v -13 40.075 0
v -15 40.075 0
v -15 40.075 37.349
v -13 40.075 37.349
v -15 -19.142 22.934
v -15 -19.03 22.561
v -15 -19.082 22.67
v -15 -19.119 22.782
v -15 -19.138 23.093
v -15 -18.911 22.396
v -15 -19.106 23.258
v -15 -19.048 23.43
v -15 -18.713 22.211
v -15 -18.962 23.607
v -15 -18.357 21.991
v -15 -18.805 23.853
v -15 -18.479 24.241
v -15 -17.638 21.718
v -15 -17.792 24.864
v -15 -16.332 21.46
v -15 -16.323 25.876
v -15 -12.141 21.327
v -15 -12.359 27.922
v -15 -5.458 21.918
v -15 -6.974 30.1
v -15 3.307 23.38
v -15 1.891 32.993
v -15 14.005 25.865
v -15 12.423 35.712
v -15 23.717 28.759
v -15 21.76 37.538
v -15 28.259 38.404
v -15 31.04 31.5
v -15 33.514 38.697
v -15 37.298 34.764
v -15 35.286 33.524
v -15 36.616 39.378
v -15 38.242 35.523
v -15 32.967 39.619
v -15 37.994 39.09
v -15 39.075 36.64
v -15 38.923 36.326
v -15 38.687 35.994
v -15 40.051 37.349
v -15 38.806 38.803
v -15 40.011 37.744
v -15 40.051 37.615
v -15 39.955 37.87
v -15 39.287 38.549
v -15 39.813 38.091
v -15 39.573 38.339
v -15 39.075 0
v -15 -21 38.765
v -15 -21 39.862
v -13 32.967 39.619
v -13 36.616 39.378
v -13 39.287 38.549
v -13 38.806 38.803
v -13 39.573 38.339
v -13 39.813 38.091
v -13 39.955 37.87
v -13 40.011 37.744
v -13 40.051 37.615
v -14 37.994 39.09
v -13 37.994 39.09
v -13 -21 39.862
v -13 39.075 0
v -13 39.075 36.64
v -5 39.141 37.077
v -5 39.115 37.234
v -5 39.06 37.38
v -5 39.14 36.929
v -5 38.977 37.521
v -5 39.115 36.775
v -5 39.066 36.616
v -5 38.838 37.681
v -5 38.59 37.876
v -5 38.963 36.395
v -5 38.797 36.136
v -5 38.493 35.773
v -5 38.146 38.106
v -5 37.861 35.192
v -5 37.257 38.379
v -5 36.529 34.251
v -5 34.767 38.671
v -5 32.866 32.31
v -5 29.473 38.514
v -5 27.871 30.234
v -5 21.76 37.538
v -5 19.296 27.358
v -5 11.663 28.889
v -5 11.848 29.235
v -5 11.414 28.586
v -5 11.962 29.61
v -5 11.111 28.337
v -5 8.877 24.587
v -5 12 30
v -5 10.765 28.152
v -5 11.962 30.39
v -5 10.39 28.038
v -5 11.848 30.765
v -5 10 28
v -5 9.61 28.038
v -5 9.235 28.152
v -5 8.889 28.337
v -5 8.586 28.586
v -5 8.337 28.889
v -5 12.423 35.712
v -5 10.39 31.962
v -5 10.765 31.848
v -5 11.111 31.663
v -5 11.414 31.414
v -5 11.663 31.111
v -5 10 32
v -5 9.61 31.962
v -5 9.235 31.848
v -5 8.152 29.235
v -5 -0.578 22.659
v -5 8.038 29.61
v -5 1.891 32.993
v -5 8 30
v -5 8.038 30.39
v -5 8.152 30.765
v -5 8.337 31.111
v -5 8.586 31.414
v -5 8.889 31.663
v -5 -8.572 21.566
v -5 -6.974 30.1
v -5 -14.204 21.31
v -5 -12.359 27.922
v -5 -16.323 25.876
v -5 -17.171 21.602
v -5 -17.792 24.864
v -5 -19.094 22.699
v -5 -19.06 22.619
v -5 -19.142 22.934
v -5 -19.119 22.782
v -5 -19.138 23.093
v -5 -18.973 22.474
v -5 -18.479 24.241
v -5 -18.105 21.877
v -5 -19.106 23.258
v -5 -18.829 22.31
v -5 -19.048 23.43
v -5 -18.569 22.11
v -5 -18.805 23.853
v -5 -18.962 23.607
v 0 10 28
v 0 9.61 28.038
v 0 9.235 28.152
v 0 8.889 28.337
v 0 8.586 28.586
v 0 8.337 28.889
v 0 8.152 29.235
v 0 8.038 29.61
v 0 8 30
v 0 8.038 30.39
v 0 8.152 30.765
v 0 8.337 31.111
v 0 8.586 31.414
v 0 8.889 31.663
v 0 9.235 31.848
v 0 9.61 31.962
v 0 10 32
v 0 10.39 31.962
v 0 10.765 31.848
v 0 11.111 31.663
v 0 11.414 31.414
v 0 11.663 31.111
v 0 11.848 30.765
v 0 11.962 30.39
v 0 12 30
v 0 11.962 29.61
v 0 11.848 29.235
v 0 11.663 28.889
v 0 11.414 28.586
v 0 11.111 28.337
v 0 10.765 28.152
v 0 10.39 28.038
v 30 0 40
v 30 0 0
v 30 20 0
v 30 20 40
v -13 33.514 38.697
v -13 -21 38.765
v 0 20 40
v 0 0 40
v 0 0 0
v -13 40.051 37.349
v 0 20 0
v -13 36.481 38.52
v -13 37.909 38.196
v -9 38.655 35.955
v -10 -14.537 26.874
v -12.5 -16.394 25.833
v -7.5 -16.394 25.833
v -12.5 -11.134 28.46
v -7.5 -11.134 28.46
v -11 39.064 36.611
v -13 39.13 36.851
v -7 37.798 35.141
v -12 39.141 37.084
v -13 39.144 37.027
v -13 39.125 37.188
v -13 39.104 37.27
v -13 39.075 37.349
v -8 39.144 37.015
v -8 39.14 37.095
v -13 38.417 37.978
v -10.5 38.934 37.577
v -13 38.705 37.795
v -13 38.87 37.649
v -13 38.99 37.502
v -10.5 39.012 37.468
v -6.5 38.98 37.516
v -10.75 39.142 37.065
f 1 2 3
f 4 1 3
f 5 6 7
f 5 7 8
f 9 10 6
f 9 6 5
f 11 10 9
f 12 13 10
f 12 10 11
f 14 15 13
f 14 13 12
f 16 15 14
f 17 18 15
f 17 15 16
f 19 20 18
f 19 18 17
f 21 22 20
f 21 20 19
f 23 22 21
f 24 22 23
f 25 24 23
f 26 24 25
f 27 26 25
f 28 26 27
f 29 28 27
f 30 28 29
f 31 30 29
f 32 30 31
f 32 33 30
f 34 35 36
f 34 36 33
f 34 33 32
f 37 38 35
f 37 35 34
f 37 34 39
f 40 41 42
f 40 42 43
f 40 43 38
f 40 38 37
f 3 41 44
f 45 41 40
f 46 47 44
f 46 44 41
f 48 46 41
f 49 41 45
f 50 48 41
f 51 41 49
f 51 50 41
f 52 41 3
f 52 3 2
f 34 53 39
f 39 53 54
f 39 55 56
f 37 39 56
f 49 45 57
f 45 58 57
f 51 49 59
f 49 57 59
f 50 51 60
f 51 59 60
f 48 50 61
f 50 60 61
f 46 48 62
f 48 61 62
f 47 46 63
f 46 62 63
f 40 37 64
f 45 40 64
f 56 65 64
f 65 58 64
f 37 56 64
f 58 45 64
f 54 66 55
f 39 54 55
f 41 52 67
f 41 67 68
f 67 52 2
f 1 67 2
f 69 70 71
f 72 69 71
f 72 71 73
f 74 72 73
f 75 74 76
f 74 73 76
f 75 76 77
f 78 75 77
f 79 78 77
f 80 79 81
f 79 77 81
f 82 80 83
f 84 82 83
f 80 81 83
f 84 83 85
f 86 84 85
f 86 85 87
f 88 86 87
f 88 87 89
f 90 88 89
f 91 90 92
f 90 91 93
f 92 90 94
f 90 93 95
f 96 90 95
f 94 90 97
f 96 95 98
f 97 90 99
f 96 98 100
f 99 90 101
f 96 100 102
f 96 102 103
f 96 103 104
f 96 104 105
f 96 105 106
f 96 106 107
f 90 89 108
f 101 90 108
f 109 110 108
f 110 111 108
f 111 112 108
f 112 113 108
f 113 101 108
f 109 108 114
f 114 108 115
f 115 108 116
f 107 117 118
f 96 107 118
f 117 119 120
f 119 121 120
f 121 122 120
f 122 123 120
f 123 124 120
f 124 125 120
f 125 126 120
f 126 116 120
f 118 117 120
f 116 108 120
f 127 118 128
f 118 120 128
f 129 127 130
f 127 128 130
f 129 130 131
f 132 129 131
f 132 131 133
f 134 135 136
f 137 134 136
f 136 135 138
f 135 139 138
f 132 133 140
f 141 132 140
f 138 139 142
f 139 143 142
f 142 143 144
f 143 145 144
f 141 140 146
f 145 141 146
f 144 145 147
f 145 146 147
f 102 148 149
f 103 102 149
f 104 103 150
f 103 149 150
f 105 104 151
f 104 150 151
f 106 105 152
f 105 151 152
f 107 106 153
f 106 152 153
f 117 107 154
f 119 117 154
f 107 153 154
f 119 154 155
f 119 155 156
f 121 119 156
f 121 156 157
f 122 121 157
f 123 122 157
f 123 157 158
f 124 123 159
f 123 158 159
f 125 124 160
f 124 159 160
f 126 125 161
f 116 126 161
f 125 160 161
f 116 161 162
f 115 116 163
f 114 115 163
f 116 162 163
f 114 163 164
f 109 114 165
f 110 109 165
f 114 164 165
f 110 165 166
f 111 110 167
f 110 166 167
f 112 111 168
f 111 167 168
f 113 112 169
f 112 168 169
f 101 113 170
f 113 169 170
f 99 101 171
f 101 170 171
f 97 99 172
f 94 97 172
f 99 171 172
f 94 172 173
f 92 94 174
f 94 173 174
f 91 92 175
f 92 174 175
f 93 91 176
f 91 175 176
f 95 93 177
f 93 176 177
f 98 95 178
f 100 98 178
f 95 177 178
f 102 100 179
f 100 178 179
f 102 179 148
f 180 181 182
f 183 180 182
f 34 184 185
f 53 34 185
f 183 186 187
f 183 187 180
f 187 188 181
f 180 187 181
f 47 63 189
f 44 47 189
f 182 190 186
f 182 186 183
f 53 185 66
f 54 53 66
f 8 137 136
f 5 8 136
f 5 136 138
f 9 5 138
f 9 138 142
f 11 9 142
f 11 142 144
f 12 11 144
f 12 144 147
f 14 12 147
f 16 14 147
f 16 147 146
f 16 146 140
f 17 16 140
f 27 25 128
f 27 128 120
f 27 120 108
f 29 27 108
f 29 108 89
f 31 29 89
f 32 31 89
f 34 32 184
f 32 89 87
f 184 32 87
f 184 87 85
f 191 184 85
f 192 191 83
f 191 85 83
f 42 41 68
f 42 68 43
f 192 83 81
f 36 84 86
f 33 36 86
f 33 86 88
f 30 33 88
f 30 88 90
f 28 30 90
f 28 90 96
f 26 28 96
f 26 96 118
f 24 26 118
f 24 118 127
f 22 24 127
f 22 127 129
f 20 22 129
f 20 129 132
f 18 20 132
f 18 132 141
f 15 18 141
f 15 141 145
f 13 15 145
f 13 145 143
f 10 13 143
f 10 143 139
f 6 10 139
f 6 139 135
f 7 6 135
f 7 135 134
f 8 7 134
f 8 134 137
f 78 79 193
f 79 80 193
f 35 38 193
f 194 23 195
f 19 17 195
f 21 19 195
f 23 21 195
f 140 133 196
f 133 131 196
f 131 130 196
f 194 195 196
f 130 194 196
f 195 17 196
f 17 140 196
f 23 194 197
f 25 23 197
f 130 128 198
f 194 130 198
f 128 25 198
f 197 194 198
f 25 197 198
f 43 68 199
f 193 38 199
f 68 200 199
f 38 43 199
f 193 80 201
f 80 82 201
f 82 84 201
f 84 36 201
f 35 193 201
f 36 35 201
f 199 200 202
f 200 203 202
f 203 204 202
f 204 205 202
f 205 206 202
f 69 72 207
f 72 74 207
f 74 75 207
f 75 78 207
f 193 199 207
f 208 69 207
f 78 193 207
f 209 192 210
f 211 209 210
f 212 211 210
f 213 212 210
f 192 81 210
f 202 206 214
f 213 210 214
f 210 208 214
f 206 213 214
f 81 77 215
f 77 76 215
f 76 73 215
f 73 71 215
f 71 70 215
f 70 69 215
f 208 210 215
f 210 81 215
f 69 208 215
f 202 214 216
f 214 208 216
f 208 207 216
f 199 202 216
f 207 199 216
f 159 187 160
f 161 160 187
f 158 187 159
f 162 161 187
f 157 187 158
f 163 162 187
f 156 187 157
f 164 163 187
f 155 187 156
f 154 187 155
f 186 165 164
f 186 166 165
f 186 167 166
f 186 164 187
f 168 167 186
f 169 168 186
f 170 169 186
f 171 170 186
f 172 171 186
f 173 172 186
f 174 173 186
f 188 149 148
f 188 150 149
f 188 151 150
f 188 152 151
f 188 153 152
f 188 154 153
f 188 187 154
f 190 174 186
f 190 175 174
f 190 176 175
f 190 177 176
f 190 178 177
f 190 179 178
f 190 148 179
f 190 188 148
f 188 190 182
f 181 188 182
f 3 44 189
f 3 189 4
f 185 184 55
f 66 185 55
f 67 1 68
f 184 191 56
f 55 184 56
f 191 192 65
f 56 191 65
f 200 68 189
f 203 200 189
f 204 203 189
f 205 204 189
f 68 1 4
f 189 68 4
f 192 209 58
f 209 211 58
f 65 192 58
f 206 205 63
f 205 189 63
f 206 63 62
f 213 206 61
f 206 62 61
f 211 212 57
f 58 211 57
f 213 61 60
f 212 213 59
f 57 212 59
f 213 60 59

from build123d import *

# Parameters (mm, degrees)
SKETCH_1_W      = 30
SKETCH_1_H      = 20
EXTRUDE_1_DEPTH = 40
SKETCH_2_R      = 2
EXTRUDE_2_DEPTH = 5
SKETCH_3_RX     = 30
SKETCH_3_RY     = 5
EXTRUDE_3_DEPTH = 10
SKETCH_4_W      = 37.348500324
SKETCH_4_H      = 1
EXTRUDE_4_DEPTH = 2
EXTRUDE_START   = -2
EXTRUDE_5_DEPTH = 2


# Read off the part's stored shape, not the designer's step: 凸台-拉伸5
with BuildPart() as part:
    # 草图1 → 凸台-拉伸1 (new body)
    with BuildSketch(Plane.XY):
        with Locations((15, 10)):
            Rectangle(SKETCH_1_W, SKETCH_1_H)
    extrude(amount=EXTRUDE_1_DEPTH)

    # 草图2 → 凸台-拉伸2 (add)
    with BuildSketch(Plane.ZY):
        with Locations(Location((30, 10, 0), (0, 0, 180))):
            Circle(SKETCH_2_R)
    extrude(amount=EXTRUDE_2_DEPTH)

    # 草图3 → 凸台-拉伸3 (add)
    with BuildSketch(Plane.ZY.offset(5)):
        with Locations(Location((30, 10), (0, 0, -103.92099691))):
            Ellipse(SKETCH_3_RX, SKETCH_3_RY)
    extrude(amount=EXTRUDE_3_DEPTH)

    # 草图4 → 凸台-拉伸4 (add)
    with BuildSketch(Plane.ZY.offset(15)):
        with Locations((18.674250162, 39.574648358)):
            Rectangle(SKETCH_4_W, SKETCH_4_H)
    extrude(amount=-EXTRUDE_4_DEPTH)

    # 凸台-拉伸5 outline → 凸台-拉伸5 (add)
    with BuildSketch(Plane.ZY.offset(15).offset(EXTRUDE_START)):
        with BuildLine():
            Line((39.862468471, -21), (39.619125683, 32.967296936))
            add(Edge.make_bspline(
                [(39.619125683, 32.967296936), (39.589392589, 39.561347803), (37.614649654, 40.050686248)],
                knots=[5.629361553, 5.629361553, 5.629361553, 6.283185307, 6.283185307, 6.283185307], degree=2, weights=[1, 0.947038516, 1]))
            Line((37.614649654, 40.050686248), (37.348500324, 40.050855796))
            Line((37.348500324, 40.050855796), (37.348500324, 39.074648358))
            add(Edge.make_bspline(
                [(38.697434301, 33.514015855), (38.694345199, 38.494694197), (37.348500324, 39.074648358)],
                knots=[5.657287765, 5.657287765, 5.657287765, 6.250122592, 6.250122592, 6.250122592], degree=2, weights=[0.790463711, 0.847402464, 0.984462923]))
            Line((38.697434301, 33.514015855), (38.765118588, -21))
            Line((38.765118588, -21), (39.862468471, -21))
        make_face()
    extrude(amount=EXTRUDE_5_DEPTH)


solid = part.part
